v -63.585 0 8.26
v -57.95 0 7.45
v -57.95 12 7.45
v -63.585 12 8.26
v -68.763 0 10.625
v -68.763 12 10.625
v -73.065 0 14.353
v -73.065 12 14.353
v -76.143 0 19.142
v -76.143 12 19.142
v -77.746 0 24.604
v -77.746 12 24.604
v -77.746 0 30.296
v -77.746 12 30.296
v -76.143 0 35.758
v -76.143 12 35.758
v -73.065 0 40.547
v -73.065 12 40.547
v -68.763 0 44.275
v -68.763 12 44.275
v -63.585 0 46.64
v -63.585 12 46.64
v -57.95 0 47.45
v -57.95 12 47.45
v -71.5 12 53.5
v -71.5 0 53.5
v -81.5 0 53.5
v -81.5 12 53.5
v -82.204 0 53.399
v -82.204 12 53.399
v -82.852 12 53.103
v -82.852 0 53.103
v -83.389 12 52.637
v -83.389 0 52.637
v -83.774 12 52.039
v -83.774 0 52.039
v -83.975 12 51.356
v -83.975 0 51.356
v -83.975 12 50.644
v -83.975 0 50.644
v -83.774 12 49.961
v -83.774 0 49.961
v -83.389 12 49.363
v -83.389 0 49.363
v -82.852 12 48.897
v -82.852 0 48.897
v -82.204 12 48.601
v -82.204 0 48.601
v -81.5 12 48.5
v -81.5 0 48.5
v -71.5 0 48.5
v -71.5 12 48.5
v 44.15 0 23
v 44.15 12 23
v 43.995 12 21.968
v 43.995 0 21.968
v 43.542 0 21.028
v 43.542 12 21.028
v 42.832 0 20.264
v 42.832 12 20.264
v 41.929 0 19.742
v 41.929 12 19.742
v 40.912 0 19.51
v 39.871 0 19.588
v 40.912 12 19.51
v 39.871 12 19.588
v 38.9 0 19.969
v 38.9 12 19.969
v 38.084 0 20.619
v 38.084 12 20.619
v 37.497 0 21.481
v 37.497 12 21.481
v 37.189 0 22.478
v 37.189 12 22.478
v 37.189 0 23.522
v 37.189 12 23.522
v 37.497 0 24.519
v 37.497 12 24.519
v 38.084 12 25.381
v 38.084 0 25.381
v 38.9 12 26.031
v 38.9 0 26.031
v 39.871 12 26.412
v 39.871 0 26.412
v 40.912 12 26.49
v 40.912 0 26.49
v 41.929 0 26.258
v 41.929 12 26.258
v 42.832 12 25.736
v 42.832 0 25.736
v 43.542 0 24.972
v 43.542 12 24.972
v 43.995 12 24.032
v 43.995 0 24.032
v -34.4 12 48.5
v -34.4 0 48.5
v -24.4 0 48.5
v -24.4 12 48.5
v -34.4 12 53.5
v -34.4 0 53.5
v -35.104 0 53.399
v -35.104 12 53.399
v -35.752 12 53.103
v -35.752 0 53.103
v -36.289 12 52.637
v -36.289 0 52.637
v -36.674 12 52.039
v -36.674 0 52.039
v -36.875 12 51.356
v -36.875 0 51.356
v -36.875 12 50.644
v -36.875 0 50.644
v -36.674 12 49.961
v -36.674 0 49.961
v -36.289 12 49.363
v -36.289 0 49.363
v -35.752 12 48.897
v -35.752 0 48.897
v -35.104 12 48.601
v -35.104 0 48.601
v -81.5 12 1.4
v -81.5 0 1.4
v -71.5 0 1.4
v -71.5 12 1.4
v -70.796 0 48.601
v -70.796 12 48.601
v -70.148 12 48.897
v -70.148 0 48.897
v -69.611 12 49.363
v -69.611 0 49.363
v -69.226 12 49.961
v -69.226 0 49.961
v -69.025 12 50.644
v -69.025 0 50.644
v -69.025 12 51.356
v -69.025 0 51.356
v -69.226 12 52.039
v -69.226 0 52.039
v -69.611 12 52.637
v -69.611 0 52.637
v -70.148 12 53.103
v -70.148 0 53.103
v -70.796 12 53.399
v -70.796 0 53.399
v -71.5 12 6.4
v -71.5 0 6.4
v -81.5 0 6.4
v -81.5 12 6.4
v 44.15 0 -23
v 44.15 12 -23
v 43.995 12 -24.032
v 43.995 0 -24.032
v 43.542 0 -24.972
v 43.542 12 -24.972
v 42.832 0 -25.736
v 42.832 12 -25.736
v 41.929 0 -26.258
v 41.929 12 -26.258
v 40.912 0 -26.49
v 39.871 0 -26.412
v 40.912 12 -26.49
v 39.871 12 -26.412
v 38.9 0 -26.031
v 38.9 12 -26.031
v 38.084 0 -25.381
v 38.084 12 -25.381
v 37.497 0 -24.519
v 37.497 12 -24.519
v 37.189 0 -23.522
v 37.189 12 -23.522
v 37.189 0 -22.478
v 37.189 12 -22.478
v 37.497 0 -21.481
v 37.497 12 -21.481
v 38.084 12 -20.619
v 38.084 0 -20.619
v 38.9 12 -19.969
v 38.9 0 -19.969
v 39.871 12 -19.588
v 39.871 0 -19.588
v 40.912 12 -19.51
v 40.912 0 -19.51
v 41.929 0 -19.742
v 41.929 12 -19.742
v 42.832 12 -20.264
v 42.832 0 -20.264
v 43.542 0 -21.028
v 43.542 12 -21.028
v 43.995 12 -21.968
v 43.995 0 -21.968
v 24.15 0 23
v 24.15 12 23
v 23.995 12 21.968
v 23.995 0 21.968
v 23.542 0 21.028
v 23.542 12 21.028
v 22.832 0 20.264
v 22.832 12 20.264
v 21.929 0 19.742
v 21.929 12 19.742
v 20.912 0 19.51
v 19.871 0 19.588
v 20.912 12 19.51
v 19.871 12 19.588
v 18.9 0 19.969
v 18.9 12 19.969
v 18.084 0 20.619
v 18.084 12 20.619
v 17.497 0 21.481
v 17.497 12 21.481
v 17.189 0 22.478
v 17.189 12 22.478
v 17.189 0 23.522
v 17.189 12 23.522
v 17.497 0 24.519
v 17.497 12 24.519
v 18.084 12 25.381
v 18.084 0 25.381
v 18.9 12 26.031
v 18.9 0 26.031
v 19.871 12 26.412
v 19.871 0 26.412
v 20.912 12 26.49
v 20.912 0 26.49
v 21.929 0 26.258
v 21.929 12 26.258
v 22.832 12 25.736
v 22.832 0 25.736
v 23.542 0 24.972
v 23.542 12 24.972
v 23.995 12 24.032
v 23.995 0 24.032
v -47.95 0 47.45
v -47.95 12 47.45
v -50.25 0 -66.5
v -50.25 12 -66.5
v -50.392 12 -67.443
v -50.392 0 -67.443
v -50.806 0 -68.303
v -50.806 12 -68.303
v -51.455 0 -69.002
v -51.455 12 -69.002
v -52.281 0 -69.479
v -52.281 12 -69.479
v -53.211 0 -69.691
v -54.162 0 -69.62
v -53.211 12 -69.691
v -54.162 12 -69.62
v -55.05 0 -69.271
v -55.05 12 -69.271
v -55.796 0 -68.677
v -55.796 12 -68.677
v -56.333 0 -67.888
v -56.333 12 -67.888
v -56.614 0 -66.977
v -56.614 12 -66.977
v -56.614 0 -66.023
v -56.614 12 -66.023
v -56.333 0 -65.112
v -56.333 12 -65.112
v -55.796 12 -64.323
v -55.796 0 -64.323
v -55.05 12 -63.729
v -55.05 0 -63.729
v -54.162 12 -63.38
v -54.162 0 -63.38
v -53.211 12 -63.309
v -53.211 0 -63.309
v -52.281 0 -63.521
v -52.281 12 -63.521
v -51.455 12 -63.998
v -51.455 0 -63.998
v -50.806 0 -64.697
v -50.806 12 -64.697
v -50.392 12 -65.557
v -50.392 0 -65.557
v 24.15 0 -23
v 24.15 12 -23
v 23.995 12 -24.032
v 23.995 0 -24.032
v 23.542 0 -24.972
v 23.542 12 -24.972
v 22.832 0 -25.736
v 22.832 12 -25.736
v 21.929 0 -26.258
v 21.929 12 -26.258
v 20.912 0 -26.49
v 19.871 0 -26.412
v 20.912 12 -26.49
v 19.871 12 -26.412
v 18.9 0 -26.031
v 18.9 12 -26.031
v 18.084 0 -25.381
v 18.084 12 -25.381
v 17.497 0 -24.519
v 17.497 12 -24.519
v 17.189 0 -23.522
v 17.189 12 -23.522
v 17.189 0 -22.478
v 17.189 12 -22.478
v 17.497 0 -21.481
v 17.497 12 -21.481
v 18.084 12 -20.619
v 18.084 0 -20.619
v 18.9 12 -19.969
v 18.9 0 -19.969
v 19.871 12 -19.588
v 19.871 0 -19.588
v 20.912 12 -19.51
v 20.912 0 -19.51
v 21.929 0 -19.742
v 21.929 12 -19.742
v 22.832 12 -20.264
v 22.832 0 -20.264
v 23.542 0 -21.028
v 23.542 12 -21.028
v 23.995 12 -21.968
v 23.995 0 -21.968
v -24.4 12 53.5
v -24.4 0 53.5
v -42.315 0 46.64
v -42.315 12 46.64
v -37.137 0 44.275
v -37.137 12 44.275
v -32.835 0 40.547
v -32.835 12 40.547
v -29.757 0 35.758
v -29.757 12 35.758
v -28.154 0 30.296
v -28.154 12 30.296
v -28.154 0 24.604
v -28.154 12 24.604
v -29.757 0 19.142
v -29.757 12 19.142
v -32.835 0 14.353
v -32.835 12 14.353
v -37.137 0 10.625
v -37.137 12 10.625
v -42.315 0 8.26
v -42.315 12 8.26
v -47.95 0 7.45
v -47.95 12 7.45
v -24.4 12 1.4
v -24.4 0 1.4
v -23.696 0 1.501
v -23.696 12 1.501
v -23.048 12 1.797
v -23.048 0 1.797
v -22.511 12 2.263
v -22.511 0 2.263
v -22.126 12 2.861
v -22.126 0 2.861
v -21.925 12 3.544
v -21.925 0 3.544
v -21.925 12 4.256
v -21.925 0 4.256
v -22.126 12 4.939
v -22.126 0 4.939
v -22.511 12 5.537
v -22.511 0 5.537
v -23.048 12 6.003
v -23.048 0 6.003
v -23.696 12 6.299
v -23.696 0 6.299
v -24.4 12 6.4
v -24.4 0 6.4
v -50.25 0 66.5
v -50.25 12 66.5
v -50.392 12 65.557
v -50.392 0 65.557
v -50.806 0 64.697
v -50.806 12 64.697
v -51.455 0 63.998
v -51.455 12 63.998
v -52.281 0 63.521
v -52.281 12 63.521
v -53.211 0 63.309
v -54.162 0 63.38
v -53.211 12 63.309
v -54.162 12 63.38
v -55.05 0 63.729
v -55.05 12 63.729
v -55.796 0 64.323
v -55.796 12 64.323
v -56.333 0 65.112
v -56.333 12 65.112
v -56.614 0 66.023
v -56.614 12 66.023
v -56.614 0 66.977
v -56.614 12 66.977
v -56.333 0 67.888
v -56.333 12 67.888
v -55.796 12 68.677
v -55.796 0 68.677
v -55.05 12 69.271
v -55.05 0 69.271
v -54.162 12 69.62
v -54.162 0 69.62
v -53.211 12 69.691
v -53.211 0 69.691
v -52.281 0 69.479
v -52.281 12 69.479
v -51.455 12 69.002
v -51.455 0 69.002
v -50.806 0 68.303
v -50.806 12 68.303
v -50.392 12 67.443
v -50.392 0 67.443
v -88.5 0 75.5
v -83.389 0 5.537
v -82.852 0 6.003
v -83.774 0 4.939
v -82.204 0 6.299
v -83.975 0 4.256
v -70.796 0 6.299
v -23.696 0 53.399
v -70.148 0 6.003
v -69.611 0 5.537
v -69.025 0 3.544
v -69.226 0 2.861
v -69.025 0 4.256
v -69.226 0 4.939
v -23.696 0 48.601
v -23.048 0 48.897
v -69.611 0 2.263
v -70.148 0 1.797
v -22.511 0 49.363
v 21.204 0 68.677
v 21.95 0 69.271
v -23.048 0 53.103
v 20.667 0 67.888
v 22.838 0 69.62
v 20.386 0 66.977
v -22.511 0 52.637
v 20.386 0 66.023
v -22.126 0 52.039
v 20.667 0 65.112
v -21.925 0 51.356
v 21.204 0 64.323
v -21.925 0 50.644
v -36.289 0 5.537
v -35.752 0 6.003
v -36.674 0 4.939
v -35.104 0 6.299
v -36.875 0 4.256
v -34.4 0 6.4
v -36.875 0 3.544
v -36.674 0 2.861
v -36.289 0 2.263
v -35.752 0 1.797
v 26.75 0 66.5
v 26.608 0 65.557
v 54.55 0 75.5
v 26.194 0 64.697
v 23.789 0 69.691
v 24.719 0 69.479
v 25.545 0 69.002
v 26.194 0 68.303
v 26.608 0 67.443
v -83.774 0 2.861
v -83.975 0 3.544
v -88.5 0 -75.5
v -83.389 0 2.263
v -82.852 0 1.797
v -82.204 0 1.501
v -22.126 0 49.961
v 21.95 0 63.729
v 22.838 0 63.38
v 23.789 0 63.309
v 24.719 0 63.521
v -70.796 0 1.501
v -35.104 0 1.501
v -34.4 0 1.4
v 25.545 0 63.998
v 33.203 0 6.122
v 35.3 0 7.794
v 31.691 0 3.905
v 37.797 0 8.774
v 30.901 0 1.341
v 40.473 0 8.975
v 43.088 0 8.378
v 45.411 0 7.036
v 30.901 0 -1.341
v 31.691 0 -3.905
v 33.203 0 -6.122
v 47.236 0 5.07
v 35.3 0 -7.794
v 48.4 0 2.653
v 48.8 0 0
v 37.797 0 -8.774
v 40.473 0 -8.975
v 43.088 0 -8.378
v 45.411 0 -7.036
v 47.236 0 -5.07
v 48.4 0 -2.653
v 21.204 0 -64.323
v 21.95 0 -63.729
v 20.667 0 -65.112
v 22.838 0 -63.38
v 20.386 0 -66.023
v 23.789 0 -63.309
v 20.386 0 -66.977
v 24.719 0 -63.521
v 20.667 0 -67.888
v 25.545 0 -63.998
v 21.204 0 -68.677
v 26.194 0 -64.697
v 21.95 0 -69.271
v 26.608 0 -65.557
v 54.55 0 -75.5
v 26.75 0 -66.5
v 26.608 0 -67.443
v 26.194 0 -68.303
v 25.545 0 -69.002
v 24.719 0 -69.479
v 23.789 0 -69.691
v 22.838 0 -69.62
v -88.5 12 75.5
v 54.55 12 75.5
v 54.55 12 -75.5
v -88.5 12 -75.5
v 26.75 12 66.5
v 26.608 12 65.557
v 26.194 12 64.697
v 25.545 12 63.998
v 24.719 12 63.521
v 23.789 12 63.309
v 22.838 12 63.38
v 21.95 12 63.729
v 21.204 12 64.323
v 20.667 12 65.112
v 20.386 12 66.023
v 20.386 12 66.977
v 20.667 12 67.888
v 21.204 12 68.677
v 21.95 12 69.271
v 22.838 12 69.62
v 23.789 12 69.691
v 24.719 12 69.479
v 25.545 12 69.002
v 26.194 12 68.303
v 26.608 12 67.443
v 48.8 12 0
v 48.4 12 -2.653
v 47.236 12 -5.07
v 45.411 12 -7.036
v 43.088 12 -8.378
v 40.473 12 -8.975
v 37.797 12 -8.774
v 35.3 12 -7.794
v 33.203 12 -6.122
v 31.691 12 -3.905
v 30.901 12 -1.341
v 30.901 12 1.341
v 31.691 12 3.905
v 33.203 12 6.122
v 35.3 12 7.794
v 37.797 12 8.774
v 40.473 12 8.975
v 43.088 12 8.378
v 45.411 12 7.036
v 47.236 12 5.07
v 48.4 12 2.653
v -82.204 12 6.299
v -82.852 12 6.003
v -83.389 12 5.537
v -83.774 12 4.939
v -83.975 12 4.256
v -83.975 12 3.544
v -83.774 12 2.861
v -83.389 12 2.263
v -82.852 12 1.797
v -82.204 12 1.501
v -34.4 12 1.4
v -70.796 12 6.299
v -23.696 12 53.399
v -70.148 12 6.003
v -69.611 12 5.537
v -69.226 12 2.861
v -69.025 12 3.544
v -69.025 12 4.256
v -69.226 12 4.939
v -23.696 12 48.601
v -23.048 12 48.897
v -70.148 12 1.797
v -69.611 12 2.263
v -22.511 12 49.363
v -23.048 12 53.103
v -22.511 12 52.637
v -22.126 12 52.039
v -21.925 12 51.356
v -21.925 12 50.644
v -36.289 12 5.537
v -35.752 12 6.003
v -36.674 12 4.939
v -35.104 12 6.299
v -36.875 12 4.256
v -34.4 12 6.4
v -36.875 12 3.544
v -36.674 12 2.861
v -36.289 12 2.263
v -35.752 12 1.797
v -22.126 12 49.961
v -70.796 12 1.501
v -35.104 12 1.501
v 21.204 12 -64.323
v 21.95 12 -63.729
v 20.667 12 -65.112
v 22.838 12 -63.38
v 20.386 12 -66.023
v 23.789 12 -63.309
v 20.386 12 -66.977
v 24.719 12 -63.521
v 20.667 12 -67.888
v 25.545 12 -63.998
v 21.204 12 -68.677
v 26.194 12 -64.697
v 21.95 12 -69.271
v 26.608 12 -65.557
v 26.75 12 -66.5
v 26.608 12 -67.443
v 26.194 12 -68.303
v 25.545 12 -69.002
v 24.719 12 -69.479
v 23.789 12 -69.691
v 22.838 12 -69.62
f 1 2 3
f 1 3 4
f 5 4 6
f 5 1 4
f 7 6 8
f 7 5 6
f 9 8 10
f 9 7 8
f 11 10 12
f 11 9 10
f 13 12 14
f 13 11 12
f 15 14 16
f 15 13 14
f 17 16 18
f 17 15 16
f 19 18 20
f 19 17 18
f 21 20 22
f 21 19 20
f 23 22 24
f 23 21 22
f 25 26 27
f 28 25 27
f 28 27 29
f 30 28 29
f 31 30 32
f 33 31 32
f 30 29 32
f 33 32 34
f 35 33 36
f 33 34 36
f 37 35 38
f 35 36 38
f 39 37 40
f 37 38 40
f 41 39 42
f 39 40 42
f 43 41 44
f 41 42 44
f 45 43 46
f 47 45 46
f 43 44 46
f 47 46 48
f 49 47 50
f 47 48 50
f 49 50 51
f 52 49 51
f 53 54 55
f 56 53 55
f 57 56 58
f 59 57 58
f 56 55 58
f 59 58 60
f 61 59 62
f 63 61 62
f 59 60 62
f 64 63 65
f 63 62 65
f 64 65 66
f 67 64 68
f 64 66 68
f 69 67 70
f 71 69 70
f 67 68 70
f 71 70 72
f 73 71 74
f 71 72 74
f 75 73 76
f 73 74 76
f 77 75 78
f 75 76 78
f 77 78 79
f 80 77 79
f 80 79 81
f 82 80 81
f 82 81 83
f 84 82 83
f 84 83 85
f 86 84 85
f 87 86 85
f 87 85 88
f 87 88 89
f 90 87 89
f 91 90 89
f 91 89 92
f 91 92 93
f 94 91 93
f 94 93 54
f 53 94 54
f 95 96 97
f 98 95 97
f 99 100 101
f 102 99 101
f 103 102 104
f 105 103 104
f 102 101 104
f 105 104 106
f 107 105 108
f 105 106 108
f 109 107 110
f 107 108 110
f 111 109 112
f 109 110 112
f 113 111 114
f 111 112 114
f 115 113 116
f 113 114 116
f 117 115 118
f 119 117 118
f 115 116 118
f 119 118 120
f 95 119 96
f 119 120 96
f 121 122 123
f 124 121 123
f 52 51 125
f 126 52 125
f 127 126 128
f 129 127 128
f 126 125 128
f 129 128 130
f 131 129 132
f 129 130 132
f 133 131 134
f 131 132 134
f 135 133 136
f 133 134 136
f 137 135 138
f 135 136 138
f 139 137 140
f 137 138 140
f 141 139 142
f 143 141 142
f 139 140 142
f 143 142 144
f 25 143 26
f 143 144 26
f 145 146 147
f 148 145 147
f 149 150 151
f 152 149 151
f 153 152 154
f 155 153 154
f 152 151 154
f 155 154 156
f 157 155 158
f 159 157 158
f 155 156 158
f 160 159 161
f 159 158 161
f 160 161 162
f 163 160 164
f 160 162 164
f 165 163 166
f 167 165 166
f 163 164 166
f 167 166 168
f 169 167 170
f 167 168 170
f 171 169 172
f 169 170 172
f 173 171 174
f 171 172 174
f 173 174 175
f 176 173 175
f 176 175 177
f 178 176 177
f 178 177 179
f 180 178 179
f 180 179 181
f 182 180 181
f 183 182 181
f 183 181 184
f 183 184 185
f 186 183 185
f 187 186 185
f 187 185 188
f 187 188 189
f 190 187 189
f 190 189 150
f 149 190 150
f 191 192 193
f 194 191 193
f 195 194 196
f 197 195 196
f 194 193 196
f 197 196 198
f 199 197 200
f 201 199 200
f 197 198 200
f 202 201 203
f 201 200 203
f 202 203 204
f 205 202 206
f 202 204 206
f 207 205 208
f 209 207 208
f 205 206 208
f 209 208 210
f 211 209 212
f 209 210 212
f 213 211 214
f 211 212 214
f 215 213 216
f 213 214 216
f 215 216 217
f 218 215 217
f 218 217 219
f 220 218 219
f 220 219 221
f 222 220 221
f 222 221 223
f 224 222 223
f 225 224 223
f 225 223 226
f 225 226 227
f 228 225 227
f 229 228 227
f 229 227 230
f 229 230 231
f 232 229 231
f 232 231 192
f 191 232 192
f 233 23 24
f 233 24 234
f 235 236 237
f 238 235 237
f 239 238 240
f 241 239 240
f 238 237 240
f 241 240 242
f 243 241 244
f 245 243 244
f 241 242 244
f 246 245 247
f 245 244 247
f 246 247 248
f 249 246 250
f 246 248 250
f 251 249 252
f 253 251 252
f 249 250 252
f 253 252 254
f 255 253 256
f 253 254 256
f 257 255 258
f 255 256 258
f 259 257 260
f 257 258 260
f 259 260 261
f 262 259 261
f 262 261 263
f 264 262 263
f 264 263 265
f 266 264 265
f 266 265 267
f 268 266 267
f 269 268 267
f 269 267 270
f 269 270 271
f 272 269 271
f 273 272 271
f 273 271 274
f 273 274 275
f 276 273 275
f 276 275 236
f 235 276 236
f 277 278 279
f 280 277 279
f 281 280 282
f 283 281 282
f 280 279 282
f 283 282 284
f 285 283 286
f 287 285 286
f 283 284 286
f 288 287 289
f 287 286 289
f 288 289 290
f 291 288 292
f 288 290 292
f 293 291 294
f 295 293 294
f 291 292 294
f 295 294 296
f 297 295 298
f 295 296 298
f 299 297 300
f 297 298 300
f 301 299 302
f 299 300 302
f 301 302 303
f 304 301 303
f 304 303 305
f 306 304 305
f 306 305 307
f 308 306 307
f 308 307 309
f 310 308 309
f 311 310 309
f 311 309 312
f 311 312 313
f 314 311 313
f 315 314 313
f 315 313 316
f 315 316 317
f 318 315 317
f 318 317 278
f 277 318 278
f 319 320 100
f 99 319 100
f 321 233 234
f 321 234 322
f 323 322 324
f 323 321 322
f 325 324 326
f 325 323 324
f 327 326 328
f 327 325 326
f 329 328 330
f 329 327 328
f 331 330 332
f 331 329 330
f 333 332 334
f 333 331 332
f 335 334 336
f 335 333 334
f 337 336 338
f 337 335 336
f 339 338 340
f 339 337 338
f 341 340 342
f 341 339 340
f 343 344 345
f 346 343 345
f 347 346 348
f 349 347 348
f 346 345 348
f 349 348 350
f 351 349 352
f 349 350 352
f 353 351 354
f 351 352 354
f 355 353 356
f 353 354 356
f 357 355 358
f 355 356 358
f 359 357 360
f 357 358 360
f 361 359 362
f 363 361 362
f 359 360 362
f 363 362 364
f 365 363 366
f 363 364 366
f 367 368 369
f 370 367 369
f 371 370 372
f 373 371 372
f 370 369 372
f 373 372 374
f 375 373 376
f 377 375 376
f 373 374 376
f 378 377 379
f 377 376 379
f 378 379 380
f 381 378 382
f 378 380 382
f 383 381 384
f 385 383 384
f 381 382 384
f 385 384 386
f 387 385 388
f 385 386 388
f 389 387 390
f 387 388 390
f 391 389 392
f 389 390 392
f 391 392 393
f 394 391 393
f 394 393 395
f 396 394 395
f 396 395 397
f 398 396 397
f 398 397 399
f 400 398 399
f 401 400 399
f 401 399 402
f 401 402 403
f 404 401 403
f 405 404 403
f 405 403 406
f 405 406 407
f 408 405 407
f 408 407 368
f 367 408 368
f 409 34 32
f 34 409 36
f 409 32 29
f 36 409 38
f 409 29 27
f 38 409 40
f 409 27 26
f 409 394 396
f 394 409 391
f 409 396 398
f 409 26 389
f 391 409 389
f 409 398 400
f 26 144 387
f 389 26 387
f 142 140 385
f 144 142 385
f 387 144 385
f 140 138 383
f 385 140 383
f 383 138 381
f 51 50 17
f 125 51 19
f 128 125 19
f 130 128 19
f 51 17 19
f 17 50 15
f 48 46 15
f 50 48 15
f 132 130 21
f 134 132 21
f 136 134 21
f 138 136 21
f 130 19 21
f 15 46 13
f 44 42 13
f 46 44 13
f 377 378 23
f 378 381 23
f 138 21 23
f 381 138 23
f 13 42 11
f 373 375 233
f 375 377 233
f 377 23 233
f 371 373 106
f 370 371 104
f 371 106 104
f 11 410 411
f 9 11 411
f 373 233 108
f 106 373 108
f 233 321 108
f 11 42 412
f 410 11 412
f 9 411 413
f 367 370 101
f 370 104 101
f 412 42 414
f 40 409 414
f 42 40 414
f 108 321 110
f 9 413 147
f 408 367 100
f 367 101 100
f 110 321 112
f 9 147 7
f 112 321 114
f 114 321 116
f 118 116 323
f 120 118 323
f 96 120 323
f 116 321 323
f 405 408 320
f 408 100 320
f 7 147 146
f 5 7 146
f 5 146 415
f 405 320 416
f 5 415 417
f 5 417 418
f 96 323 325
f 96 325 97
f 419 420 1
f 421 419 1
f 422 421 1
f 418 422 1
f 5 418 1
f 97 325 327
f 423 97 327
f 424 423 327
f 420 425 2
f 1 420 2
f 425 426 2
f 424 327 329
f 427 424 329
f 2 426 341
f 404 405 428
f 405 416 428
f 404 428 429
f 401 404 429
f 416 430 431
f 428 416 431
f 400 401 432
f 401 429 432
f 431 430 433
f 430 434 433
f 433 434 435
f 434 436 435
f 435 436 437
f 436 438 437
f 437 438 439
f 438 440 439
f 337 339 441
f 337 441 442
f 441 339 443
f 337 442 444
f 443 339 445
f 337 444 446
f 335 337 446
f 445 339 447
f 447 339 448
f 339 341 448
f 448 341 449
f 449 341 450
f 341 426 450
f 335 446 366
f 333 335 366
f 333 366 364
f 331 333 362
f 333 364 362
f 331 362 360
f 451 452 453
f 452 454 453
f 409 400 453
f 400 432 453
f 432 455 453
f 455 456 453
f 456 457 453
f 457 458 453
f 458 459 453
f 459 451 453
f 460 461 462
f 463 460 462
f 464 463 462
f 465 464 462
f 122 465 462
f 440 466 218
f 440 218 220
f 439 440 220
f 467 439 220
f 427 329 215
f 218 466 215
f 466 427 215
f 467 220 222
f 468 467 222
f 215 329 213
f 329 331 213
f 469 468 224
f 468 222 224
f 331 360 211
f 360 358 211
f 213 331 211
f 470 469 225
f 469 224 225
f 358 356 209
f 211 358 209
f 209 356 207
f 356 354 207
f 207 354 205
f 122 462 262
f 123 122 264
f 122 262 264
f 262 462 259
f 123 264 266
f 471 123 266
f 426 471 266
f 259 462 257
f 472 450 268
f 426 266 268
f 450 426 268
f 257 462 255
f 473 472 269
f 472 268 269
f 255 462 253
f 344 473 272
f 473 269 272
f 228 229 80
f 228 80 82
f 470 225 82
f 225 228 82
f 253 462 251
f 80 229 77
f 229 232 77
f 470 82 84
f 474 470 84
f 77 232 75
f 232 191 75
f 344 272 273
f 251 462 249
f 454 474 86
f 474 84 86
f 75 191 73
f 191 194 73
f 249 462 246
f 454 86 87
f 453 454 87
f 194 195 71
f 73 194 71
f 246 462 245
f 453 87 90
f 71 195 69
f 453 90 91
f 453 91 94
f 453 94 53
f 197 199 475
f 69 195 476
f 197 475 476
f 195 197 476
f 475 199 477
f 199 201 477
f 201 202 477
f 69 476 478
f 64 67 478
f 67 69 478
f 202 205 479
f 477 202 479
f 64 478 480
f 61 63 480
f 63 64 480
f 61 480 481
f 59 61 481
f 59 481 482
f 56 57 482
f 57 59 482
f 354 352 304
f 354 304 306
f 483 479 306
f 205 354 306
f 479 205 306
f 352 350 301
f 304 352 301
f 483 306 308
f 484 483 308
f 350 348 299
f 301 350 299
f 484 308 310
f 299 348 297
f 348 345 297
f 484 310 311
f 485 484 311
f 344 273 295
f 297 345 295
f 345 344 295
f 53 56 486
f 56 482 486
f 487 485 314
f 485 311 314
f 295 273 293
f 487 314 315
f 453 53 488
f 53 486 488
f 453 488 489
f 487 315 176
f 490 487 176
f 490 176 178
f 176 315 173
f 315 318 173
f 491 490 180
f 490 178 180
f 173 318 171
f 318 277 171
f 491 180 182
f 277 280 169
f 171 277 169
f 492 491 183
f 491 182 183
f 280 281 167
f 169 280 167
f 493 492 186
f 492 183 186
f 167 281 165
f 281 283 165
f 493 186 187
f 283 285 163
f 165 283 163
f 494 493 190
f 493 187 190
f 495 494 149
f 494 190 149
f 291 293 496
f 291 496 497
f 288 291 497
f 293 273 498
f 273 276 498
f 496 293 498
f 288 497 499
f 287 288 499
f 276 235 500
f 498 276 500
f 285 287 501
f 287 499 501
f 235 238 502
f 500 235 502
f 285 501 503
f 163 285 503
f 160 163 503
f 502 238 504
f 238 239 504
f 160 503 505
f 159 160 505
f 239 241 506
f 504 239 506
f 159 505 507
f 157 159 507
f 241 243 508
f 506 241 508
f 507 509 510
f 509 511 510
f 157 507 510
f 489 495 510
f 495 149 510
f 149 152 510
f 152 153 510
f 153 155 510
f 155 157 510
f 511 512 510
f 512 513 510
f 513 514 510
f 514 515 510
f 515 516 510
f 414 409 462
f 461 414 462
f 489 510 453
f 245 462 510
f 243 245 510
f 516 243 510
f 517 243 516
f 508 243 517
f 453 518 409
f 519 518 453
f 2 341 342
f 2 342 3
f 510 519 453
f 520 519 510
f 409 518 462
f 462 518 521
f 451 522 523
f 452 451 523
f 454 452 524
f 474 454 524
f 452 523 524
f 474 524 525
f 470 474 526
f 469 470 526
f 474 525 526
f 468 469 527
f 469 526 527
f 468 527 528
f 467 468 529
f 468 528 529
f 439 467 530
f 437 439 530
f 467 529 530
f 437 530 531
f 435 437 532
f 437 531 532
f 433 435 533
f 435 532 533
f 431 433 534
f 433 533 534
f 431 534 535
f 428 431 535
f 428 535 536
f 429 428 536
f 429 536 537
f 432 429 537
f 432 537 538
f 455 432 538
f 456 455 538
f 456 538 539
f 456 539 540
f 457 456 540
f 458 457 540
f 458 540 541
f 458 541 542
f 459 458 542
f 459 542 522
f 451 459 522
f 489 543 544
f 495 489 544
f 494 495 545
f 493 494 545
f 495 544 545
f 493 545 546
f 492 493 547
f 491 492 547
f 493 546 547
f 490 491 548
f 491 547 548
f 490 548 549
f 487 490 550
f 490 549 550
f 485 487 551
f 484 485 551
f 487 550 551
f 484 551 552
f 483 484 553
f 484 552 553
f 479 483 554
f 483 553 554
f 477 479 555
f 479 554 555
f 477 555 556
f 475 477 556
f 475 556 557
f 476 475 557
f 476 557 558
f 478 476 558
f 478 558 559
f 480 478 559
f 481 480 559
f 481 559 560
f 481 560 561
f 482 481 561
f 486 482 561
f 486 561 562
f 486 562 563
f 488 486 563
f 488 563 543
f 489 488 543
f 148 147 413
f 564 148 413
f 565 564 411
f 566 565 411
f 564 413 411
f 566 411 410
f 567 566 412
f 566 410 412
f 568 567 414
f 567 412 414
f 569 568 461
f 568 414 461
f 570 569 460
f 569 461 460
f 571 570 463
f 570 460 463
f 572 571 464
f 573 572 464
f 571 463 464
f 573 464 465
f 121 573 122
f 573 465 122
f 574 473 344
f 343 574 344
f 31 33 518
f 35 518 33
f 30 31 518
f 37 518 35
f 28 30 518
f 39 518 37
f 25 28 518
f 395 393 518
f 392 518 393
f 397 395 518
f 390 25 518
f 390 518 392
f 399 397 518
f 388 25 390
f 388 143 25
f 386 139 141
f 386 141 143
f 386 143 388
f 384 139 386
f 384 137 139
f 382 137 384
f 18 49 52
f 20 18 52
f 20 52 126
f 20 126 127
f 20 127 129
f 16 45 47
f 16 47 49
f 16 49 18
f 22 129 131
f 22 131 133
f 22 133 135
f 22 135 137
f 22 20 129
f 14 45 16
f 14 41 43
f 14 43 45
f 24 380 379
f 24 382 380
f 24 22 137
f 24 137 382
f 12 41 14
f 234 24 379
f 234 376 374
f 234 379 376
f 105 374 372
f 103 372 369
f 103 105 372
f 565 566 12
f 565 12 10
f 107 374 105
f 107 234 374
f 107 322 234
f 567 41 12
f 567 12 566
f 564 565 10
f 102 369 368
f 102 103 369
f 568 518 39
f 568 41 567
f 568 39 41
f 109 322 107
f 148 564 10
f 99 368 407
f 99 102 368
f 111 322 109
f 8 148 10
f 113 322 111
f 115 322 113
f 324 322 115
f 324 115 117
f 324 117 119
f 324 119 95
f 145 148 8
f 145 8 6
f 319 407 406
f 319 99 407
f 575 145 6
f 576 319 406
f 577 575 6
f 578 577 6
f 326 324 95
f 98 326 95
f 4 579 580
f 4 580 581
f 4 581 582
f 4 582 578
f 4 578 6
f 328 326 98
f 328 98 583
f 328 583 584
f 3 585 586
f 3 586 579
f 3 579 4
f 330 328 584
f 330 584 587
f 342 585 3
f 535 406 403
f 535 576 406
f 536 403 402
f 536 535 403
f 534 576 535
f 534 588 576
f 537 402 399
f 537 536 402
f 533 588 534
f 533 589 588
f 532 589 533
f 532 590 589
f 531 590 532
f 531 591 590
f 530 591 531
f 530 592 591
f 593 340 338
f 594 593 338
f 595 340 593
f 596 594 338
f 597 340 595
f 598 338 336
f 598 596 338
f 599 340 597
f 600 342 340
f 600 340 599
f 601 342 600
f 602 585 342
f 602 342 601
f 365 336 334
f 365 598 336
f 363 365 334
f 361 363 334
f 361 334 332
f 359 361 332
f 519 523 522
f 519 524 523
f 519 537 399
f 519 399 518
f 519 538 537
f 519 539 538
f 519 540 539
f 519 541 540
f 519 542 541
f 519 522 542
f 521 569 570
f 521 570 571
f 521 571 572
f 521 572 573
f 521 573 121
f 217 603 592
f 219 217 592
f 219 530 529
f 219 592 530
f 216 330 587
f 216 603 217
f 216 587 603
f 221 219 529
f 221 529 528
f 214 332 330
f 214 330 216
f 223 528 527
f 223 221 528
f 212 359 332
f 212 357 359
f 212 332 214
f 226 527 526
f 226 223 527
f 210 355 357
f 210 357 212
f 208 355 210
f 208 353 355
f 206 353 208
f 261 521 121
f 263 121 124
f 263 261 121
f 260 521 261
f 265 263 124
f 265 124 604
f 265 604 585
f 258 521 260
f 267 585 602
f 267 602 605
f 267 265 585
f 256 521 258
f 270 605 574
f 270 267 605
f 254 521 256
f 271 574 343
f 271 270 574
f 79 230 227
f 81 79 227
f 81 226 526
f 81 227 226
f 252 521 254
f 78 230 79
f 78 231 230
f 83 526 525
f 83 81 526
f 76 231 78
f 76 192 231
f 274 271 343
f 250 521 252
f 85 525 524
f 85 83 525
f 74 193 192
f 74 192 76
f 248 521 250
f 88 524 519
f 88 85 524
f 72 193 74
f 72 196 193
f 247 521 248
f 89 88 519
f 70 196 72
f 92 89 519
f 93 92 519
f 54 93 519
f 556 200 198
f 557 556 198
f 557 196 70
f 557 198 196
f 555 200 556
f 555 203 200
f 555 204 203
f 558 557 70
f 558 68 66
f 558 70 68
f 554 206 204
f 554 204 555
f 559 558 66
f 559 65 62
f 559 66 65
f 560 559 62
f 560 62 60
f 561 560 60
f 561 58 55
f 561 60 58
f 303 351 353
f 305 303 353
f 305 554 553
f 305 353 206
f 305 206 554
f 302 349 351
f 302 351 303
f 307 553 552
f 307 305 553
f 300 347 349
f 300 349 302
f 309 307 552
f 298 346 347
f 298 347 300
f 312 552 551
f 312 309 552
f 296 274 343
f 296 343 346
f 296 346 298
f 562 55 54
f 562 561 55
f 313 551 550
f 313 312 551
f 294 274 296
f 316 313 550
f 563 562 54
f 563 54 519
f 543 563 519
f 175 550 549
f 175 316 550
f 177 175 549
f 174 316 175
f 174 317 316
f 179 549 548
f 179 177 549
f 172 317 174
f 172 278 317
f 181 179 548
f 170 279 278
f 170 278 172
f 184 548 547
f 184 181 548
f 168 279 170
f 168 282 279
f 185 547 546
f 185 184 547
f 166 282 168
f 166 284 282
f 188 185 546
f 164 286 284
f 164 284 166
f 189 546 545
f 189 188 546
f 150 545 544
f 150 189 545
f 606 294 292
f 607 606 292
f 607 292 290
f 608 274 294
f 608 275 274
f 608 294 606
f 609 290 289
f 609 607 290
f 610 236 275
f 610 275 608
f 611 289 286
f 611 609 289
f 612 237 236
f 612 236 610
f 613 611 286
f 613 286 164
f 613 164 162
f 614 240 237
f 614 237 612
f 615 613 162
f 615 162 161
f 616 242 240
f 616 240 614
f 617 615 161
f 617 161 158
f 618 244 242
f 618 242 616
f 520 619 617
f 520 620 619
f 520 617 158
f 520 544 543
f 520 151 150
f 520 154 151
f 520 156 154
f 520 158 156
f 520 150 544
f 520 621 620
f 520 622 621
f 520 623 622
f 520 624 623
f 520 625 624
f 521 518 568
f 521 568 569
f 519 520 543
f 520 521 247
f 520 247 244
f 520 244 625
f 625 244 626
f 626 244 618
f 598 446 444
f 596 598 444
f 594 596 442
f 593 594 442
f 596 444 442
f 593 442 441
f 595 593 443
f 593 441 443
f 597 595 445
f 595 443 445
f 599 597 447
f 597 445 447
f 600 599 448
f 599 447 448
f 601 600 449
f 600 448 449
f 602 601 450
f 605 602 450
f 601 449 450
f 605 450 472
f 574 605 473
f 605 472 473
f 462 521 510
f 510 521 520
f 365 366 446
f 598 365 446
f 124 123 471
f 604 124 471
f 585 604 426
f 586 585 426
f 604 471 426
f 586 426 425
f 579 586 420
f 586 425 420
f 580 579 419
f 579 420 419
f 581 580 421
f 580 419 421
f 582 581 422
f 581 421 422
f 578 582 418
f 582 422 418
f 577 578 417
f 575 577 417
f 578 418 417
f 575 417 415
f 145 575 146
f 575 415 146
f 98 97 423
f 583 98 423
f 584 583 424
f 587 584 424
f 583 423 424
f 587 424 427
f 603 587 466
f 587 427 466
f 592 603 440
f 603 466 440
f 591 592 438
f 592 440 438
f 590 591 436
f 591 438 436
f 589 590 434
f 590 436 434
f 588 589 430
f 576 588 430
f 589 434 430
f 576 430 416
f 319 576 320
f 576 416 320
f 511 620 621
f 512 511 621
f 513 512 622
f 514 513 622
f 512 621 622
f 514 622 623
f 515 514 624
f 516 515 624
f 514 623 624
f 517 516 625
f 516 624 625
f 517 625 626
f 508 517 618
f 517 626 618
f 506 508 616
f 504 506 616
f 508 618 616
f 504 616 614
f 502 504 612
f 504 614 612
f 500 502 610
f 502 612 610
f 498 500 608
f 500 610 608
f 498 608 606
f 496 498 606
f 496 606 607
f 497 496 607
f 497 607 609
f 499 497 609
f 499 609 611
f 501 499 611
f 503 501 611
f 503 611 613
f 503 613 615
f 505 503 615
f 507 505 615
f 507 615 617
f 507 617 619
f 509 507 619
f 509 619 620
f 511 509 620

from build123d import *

# Parameters (mm, degrees)
SKETCH1_W           = 147
SKETCH1_H           = 151
BOSS_EXTRUDE1_DEPTH = 12
SKETCH2_R           = 9
SKETCH2_R_2         = 3.5
CUT_EXTRUDE1_DEPTH  = 13
SKETCH6_W           = 15
SKETCH6_H           = 151
BOSS_EXTRUDE2_DEPTH = 12
CUT_EXTRUDE3_DEPTH  = 13
SKETCH5_W           = 18.95
SKETCH5_H           = 151
CUT_EXTRUDE4_DEPTH  = 13
SKETCH7_R           = 3.2
CUT_EXTRUDE5_DEPTH  = 13


with BuildPart() as part:
    # Sketch1 → Boss-Extrude1 (new body)
    with BuildSketch(Plane(origin=(0, 0, 0), x_dir=(1, 0, 0), z_dir=(0, 1, 0))):
        Rectangle(SKETCH1_W, SKETCH1_H)
    extrude(amount=BOSS_EXTRUDE1_DEPTH)

    # Sketch2 → Cut-Extrude1 (cut, through all)
    with BuildSketch(Plane(origin=(0, 12, 0), x_dir=(1, 0, 0), z_dir=(0, 1, 0))):
        with Locations((39.8, 0)):
            Circle(SKETCH2_R)
        with Locations((20.65, -23)):
            Circle(SKETCH2_R_2)
        with Locations((40.65, -23)):
            Circle(SKETCH2_R_2)
        with Locations((40.65, 23)):
            Circle(SKETCH2_R_2)
        with Locations((20.65, 23)):
            Circle(SKETCH2_R_2)
    extrude(amount=-CUT_EXTRUDE1_DEPTH, mode=Mode.SUBTRACT)

    # Sketch6 → Boss-Extrude2 (add)
    with BuildSketch(Plane(origin=(0, 12, 0), x_dir=(1, 0, 0), z_dir=(0, 1, 0))):
        with Locations((-81, 0)):
            Rectangle(SKETCH6_W, SKETCH6_H)
    extrude(amount=-BOSS_EXTRUDE2_DEPTH)

    # Sketch4 → Cut-Extrude3 (cut, through all)
    with BuildSketch(Plane.XZ):
        with BuildLine():
            Line((-71.5, 53.5), (-81.5, 53.5))
            ThreePointArc((-81.5, 53.5), (-84, 51), (-81.5, 48.5))
            Line((-81.5, 48.5), (-71.5, 48.5))
            ThreePointArc((-71.5, 48.5), (-69, 51), (-71.5, 53.5))
        make_face()
        with BuildLine():
            Line((-71.5, 6.4), (-81.5, 6.4))
            ThreePointArc((-81.5, 6.4), (-84, 3.9), (-81.5, 1.4))
            Line((-81.5, 1.4), (-71.5, 1.4))
            ThreePointArc((-71.5, 1.4), (-69, 3.9), (-71.5, 6.4))
        make_face()
        with BuildLine():
            Line((-57.95, 47.45), (-47.95, 47.45))
            ThreePointArc((-47.95, 47.45), (-27.95, 27.45), (-47.95, 7.45))
            Line((-47.95, 7.45), (-57.95, 7.45))
            ThreePointArc((-57.95, 7.45), (-77.95, 27.45), (-57.95, 47.45))
        make_face()
        with BuildLine():
            Line((-34.4, 1.4), (-24.4, 1.4))
            ThreePointArc((-24.4, 1.4), (-21.9, 3.9), (-24.4, 6.4))
            Line((-24.4, 6.4), (-34.4, 6.4))
            ThreePointArc((-34.4, 6.4), (-36.9, 3.9), (-34.4, 1.4))
        make_face()
        with BuildLine():
            Line((-34.4, 48.5), (-24.4, 48.5))
            ThreePointArc((-24.4, 48.5), (-21.9, 51), (-24.4, 53.5))
            Line((-24.4, 53.5), (-34.4, 53.5))
            ThreePointArc((-34.4, 53.5), (-36.9, 51), (-34.4, 48.5))
        make_face()
    extrude(amount=-CUT_EXTRUDE3_DEPTH, mode=Mode.SUBTRACT)

    # Sketch5 → Cut-Extrude4 (cut, through all)
    with BuildSketch(Plane(origin=(0, 12, 0), x_dir=(1, 0, 0), z_dir=(0, 1, 0))):
        with Locations((64.025, 0)):
            Rectangle(SKETCH5_W, SKETCH5_H)
    extrude(amount=-CUT_EXTRUDE4_DEPTH, mode=Mode.SUBTRACT)

    # Sketch7 → Cut-Extrude5 (cut, through all)
    with BuildSketch(Plane(origin=(0, 12, 0), x_dir=(1, 0, 0), z_dir=(0, 1, 0))):
        with Locations((23.55, -66.5)):
            Circle(SKETCH7_R)
        with Locations((-53.45, -66.5)):
            Circle(SKETCH7_R)
        with Locations((-53.45, 66.5)):
            Circle(SKETCH7_R)
        with Locations((23.55, 66.5)):
            Circle(SKETCH7_R)
    extrude(amount=-CUT_EXTRUDE5_DEPTH, mode=Mode.SUBTRACT)


solid = part.part
